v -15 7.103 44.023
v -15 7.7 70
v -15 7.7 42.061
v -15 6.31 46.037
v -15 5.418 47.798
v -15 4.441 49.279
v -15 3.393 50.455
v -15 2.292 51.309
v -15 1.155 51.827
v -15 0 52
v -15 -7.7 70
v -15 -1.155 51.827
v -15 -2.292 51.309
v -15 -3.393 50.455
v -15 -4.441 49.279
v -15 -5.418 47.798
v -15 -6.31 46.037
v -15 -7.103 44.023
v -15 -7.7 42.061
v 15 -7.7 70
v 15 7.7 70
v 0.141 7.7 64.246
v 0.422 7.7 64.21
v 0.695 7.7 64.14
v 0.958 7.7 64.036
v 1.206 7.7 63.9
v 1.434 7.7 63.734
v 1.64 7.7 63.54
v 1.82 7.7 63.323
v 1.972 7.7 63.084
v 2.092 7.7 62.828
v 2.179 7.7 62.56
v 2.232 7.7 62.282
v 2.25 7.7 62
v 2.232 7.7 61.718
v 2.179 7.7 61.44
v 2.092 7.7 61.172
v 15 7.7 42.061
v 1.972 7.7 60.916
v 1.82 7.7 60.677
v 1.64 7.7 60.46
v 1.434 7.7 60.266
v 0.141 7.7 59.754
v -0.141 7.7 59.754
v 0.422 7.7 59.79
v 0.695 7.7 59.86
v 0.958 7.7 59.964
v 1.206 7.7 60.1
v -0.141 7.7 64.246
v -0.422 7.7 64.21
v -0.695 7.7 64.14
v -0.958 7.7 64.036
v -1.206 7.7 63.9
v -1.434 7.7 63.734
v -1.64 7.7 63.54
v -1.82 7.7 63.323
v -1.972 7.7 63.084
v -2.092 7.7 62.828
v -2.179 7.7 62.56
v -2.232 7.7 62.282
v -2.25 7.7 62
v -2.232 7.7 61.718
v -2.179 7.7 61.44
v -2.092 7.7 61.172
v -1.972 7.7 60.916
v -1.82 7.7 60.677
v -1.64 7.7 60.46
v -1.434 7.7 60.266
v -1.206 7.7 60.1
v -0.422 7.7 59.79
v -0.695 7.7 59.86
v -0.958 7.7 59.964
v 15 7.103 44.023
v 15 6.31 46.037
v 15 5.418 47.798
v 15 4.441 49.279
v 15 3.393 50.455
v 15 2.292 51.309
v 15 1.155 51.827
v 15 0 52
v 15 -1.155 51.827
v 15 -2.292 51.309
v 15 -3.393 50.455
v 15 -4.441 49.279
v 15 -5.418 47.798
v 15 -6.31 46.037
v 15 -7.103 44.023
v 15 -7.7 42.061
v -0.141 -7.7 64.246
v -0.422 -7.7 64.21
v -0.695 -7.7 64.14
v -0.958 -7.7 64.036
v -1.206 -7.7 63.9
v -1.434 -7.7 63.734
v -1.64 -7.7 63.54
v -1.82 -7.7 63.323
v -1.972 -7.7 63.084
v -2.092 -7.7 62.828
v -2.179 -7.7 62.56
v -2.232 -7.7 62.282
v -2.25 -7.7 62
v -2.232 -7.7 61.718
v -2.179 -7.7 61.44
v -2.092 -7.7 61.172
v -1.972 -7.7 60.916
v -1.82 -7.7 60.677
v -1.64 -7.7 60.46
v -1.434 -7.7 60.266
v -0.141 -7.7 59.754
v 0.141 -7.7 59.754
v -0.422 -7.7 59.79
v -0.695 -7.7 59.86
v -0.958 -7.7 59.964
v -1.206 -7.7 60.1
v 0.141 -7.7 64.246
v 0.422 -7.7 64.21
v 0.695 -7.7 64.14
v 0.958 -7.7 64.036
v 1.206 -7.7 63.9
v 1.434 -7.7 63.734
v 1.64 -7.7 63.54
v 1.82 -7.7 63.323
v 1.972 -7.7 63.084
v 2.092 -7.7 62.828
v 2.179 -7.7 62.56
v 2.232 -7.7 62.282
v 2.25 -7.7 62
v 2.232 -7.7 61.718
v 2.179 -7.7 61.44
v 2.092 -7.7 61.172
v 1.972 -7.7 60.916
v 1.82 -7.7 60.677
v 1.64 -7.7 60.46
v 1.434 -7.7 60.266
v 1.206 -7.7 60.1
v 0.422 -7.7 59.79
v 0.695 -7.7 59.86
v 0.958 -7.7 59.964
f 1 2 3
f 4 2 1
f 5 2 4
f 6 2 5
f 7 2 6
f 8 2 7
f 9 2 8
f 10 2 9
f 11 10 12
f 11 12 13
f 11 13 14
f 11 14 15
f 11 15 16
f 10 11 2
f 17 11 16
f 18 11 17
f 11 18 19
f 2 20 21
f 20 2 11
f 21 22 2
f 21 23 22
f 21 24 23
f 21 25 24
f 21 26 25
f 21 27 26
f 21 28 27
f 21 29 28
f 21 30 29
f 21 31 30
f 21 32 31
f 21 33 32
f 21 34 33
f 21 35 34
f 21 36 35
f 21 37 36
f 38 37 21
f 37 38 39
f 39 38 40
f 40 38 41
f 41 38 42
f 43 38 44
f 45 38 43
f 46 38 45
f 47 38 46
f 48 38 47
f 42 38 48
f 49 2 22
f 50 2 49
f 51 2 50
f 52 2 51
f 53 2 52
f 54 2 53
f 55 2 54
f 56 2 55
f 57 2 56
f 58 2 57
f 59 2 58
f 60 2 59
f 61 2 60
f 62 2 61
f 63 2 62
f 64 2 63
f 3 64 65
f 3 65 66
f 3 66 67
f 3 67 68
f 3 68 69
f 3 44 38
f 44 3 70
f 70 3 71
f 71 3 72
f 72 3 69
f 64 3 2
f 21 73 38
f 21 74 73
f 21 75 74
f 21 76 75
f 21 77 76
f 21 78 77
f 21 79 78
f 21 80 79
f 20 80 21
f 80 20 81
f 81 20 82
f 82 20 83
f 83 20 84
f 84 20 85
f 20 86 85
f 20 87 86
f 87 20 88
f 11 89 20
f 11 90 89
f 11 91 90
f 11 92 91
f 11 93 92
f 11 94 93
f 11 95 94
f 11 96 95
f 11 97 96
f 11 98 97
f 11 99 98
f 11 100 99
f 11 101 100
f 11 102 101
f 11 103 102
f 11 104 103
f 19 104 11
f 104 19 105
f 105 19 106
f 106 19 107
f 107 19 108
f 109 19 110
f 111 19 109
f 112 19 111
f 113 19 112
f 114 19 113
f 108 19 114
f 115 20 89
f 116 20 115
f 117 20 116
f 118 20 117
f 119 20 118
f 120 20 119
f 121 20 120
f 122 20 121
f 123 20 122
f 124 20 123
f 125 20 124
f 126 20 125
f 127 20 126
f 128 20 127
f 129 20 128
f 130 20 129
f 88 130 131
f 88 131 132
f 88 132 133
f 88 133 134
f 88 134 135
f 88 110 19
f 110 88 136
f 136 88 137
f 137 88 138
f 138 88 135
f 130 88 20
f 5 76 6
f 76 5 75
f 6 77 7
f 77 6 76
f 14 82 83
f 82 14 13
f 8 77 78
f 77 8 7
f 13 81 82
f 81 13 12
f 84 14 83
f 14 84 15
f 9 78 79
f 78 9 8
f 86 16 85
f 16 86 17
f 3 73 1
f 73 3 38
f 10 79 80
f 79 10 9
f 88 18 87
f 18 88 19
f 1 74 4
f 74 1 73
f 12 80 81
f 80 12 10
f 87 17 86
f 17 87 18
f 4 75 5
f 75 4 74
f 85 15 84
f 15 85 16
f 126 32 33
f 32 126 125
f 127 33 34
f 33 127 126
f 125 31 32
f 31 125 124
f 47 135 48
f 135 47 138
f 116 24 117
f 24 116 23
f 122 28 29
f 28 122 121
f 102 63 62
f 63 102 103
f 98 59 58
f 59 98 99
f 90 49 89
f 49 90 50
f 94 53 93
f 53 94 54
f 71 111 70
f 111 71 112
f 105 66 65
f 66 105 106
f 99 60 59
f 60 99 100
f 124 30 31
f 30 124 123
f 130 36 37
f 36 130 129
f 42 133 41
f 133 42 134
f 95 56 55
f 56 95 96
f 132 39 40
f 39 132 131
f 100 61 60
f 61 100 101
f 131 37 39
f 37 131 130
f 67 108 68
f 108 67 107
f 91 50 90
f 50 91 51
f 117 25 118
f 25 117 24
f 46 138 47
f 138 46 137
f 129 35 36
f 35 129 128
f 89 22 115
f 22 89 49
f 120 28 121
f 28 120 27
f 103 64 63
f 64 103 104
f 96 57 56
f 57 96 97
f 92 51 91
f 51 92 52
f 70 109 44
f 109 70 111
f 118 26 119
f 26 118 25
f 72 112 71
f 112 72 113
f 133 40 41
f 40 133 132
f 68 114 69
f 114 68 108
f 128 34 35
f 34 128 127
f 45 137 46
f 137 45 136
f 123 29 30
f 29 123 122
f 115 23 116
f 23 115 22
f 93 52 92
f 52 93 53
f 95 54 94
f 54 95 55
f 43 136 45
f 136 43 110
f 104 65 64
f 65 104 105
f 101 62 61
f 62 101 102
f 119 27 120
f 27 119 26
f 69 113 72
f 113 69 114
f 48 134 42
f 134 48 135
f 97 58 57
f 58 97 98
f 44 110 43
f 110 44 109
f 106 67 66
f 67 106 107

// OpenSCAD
$fn = 50;

stick_height = 44;
stick_width = 18.4;
stick_depth = 50;

holder_height = 60;
holder_width = 30;
holder_depth = 30;

keeper_height = 30;
keeper_width = stick_width + 10;
keeper_depth = holder_depth;
keeper_position = holder_height - 20;

keeper_cut_height = 40;
keeper_cut_width = stick_width;
keeper_cut_depth = holder_depth;
keeper_cut_position = holder_height - 30;

screw_hole_d = 4.5;
screw_hole_position = keeper_position + keeper_height - 8;
screw_hole_width = 2 * holder_width;

keeper_distance = 3;

module stick() {
    rotate([0, 90, 0])
    translate([0, 0, -stick_depth/2])
    linear_extrude(height=stick_depth)
    resize([stick_height, stick_width])
    circle(1);
};

difference() {
    translate([0, 0, keeper_cut_position])
    linear_extrude(height=keeper_cut_height)
    square([keeper_cut_depth, keeper_cut_width - keeper_distance], center=true);

    translate([
                0,
                0,
                holder_height/2
            ])
    stick();
    
    translate([0, 0, screw_hole_position])
    rotate([90, 0, 0])
    cylinder(r1=screw_hole_d/2, r2=screw_hole_d/2, h=screw_hole_width, center=true);
};
